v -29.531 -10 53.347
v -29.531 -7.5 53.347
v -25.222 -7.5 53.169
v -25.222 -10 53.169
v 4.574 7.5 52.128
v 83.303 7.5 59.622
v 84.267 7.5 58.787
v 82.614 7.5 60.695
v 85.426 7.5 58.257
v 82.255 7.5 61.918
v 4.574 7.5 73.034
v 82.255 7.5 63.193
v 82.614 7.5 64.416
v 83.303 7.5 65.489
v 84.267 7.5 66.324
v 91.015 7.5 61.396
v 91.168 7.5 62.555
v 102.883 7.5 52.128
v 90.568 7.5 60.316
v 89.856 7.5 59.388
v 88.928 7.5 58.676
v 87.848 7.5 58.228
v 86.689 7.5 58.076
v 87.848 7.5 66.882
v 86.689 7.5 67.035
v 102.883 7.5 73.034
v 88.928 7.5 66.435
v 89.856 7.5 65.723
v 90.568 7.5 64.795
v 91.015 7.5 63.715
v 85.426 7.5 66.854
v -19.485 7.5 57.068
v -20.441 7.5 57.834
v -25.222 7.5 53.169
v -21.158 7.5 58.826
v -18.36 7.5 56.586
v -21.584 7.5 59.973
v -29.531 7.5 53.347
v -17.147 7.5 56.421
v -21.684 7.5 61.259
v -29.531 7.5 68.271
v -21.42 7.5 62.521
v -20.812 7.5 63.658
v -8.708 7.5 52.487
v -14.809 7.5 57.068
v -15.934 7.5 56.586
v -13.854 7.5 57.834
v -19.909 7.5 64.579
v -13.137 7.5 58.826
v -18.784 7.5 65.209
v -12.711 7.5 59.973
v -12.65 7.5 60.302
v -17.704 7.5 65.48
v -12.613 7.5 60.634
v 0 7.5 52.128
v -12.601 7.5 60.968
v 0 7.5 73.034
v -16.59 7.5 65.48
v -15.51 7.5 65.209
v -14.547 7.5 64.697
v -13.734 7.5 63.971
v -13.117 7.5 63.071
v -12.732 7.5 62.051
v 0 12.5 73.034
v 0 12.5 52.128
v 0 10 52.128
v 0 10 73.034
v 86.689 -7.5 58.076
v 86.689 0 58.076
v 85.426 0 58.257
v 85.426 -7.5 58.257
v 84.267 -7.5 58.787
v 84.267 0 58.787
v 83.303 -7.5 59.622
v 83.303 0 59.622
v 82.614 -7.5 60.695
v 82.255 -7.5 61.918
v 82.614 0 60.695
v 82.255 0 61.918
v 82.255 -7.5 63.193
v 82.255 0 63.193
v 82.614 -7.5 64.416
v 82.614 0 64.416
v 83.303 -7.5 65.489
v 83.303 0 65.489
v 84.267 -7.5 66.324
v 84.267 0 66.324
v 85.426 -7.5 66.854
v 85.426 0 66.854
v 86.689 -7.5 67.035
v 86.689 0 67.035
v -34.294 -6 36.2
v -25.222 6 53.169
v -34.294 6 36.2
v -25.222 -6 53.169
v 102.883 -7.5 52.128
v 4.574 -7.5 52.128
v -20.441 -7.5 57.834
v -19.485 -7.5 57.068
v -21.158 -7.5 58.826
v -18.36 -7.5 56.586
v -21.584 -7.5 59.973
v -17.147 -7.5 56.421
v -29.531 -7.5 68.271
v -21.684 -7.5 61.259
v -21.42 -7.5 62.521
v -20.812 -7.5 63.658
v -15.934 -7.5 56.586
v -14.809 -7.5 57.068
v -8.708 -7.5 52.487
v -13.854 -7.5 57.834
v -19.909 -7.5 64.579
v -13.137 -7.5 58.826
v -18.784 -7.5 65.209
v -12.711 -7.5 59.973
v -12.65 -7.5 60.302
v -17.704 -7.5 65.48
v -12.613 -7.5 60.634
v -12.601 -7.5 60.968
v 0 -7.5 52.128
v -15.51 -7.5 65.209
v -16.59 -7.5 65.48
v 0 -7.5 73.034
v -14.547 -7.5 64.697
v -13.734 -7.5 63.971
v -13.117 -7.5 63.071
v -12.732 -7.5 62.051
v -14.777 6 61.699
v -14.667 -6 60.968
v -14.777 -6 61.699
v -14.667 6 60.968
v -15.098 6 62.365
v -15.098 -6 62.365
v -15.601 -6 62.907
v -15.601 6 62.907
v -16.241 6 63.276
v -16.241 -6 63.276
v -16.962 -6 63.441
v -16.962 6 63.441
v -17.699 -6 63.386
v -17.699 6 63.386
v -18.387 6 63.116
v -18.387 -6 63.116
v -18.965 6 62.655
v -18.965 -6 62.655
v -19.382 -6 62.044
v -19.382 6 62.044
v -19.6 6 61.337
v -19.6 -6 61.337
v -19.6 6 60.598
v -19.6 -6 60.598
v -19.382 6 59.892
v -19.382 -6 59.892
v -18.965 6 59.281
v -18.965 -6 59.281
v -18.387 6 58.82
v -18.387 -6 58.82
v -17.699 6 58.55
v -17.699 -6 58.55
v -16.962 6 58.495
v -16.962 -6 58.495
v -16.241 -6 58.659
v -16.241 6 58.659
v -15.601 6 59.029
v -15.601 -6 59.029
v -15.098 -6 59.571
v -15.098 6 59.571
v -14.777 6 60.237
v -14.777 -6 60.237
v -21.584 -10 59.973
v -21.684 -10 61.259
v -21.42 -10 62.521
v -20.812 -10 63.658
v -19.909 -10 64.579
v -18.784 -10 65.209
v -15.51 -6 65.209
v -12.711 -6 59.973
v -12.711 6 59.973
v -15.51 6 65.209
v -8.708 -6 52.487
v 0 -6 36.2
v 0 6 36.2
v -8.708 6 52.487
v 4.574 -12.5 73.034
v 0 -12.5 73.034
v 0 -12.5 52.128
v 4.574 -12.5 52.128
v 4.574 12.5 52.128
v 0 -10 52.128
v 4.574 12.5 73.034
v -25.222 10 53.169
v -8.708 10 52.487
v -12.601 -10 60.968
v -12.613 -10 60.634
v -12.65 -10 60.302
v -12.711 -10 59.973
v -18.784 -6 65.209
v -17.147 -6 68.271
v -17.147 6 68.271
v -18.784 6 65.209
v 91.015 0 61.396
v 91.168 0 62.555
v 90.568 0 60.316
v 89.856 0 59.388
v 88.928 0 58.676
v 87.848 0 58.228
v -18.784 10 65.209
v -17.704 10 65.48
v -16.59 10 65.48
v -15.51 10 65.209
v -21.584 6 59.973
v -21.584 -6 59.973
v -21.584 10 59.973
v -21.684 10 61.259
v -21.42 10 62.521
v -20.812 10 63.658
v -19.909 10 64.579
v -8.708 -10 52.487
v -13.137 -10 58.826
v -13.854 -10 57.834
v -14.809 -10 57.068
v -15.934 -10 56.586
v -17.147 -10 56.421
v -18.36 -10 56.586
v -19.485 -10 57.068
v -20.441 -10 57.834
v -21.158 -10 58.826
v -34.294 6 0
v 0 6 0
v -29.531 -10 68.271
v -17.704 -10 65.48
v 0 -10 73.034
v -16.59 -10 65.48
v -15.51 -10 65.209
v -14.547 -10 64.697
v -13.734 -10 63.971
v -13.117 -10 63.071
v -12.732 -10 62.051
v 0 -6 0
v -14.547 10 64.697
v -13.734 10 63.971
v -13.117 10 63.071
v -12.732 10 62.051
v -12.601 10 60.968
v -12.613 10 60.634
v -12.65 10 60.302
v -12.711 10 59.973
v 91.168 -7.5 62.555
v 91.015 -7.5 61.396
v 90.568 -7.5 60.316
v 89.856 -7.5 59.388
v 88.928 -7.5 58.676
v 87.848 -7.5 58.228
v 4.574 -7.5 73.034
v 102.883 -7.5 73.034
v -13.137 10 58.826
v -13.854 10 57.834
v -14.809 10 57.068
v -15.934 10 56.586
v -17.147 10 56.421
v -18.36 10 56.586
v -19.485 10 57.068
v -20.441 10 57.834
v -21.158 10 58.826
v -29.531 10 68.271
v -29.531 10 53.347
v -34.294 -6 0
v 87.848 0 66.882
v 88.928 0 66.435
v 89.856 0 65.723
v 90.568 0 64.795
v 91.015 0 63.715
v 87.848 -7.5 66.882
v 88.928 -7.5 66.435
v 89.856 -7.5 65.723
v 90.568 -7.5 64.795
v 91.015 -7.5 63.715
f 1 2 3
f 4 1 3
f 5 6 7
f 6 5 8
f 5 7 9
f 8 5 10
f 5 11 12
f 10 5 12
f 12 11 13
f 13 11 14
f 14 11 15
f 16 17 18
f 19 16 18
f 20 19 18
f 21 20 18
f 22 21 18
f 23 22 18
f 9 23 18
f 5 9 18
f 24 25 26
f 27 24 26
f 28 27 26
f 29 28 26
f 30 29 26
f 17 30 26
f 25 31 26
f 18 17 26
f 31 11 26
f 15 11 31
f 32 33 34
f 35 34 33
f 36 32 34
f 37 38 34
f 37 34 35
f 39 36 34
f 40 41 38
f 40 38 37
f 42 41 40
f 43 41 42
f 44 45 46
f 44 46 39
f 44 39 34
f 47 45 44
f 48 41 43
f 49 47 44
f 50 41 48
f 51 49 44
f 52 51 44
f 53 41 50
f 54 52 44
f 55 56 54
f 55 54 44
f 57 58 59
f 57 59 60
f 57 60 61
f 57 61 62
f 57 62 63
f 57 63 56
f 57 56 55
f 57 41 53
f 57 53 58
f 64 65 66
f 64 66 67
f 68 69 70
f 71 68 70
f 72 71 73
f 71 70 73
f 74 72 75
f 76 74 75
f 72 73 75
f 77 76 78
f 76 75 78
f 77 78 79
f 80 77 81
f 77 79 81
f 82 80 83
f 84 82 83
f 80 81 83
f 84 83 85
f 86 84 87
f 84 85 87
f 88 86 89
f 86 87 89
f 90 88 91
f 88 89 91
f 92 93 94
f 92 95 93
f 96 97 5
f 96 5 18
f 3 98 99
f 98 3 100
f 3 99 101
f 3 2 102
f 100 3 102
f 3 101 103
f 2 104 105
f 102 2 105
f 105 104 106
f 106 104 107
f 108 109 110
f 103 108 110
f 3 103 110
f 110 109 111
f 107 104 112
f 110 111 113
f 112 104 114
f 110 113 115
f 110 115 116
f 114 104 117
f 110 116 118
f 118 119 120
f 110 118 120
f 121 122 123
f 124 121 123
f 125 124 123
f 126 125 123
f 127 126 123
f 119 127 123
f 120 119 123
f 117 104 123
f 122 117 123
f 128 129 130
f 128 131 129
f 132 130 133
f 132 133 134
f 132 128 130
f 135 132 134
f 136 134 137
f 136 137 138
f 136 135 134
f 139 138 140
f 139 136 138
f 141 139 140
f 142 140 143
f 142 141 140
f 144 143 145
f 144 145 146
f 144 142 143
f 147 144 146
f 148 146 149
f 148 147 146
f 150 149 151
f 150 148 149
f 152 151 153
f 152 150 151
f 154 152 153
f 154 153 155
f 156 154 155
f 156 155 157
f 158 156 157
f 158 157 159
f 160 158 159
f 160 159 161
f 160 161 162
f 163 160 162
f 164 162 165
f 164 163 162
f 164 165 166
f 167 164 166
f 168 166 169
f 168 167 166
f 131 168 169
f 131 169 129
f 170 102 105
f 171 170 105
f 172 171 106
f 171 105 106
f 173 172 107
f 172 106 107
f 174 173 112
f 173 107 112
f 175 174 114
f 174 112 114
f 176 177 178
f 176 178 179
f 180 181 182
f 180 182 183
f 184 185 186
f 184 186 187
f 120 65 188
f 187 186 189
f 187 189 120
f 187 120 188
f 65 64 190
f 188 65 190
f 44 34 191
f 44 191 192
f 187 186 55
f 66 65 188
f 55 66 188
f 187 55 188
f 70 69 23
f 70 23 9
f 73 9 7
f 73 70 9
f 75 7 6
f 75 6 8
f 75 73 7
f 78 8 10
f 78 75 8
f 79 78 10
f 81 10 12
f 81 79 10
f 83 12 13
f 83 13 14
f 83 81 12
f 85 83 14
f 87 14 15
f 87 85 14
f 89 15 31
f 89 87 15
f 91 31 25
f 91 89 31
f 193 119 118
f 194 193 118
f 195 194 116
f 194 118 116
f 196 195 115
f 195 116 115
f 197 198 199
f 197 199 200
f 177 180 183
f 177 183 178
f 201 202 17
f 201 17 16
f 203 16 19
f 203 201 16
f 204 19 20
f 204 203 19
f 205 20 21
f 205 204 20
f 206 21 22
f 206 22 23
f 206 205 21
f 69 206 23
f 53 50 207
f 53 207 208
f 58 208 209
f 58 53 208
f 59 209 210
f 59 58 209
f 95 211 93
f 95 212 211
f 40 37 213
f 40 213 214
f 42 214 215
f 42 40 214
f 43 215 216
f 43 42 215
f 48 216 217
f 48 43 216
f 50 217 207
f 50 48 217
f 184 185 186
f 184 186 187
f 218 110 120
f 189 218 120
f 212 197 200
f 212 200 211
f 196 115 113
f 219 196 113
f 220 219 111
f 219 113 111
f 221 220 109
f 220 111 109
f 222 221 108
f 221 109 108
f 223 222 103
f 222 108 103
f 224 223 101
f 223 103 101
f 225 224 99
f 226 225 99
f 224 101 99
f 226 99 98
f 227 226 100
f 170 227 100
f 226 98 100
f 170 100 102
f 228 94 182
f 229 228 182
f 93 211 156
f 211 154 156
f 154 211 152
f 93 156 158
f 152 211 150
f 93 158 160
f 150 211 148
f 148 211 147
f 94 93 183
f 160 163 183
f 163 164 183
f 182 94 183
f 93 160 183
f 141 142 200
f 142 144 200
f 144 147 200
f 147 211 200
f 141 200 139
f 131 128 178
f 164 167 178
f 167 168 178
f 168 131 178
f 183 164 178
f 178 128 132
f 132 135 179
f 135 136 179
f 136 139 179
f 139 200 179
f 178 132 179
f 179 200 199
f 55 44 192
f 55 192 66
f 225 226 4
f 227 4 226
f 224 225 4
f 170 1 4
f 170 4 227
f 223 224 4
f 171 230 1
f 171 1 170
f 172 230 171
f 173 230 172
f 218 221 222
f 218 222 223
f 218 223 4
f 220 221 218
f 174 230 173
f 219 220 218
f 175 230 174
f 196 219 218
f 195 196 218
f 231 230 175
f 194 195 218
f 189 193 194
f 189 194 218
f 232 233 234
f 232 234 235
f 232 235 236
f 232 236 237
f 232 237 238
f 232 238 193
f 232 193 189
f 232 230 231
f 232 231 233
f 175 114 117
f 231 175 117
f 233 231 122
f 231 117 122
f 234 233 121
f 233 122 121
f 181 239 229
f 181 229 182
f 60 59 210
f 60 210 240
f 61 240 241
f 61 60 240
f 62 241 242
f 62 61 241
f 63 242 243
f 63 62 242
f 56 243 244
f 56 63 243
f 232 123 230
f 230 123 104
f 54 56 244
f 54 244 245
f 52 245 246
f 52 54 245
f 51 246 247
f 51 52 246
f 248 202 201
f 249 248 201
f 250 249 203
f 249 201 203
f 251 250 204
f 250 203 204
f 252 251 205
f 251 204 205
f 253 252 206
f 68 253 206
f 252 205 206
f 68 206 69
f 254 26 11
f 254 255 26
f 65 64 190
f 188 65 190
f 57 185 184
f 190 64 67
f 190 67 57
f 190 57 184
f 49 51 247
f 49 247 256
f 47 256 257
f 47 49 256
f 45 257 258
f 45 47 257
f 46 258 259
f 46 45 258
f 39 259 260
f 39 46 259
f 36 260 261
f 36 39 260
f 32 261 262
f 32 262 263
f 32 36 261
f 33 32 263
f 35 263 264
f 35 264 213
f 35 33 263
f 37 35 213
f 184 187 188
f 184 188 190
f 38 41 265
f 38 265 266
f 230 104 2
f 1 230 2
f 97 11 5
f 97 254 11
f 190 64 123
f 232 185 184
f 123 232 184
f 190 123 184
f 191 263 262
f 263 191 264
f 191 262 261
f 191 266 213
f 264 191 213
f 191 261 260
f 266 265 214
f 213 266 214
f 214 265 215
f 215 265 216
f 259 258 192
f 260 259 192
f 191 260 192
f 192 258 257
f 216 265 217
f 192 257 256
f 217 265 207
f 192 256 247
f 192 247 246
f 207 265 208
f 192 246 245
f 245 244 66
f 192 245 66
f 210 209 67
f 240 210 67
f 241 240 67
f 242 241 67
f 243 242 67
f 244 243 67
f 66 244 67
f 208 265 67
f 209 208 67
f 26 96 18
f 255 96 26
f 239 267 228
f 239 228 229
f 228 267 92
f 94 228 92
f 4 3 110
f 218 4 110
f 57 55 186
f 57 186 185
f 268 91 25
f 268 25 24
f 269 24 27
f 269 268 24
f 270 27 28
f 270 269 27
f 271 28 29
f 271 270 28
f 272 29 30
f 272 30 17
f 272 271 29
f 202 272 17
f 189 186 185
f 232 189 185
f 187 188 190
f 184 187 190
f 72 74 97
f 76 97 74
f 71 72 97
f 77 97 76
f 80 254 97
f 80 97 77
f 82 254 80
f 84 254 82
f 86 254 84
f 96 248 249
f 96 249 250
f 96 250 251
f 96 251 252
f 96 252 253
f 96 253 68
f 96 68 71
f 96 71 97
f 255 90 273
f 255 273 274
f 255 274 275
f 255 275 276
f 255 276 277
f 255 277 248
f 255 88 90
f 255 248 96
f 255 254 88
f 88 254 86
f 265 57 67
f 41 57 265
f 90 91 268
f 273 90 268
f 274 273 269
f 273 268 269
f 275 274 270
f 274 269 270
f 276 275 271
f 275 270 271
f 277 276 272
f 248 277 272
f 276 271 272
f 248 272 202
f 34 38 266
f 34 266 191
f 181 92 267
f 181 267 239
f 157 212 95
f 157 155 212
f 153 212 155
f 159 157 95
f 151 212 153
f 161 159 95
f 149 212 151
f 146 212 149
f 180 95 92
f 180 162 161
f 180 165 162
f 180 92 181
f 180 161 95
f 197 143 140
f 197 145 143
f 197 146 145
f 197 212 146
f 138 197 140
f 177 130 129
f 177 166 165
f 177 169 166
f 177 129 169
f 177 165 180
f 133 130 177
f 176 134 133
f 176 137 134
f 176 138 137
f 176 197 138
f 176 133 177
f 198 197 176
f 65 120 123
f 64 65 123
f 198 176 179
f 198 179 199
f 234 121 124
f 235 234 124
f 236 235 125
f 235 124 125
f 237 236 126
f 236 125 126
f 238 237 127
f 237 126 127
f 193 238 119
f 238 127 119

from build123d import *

# Parameters (mm, degrees)
F0_W     = 4.574092105
F0_H     = 20.906448481
F1_DEPTH = 12.5
F2_START = 7.5
F2_DEPTH = 2.5
F4_DEPTH = 7.5
F0_W_2   = 34.2943556607
F0_H_2   = 36.1995995045
F0_R     = 2.4800674326
F5_DEPTH = 6


with BuildPart() as f1:
    # F0 (on Front) → F1 (new body, symmetric)
    with BuildSketch(Plane.XZ):
        with Locations((2.2870460525, 62.5810548079)):
            Rectangle(F0_W, F0_H)
    extrude(amount=F1_DEPTH, both=True)

    # F0 (on Front) → F2 (join)
    with BuildSketch(Plane.XZ.offset(F2_START)):
        with BuildLine():
            Line((-25.2216641664, 53.168891048), (-8.7082639789, 52.4872766937))
            Line((-8.7082639789, 52.4872766937), (-12.7107553091, 59.9734170883))
            ThreePointArc((-12.7107553091, 59.9734170883), (-17.1471778303, 56.4212579855), (-21.5836003516, 59.9734170883))
            Line((-21.5836003516, 59.9734170883), (-25.2216641664, 53.168891048))
        make_face()
        with BuildLine():
            Line((-12.7107553091, 59.9734170883), (-8.7082639789, 52.4872766937))
            Line((-8.7082639789, 52.4872766937), (0, 52.1278305674))
            Line((0, 52.1278305674), (0, 73.0342790484))
            Line((0, 73.0342790484), (-29.5312516391, 68.271169439))
            Line((-29.5312516391, 68.271169439), (-29.5312516391, 53.3467754722))
            Line((-29.5312516391, 53.3467754722), (-25.2216641664, 53.168891048))
            Line((-25.2216641664, 53.168891048), (-21.5836003516, 59.9734170883))
            ThreePointArc((-21.5836003516, 59.9734170883), (-21.1565826315, 63.1113857959), (-18.7842306449, 65.2092746859))
            Line((-18.7842306449, 65.2092746859), (-17.1471778303, 68.271169439))
            Line((-17.1471778303, 68.271169439), (-15.5101250158, 65.2092746859))
            ThreePointArc((-15.5101250158, 65.2092746859), (-13.3979534883, 63.5394833579), (-12.6006924191, 60.9677433968))
            ThreePointArc((-12.6006924191, 60.9677433968), (-12.6282919131, 60.4675437748), (-12.7107553091, 59.9734170883))
        make_face()
        with BuildLine():
            ThreePointArc((-18.7842306449, 65.2092746859), (-17.1471778303, 65.514228808), (-15.5101250158, 65.2092746859))
            Line((-15.5101250158, 65.2092746859), (-17.1471778303, 68.271169439))
            Line((-17.1471778303, 68.271169439), (-18.7842306449, 65.2092746859))
        make_face()
    extrude(amount=F2_DEPTH)


with BuildPart() as f3_1:
    # F3: instance of F1
    add(f1.part.mirror(Plane.XZ))


with BuildPart() as f4:
    # F0 (on Front) → F4 (new body, symmetric)
    with BuildSketch(Plane.XZ):
        Polygon((4.574092105, 73.0342790484), (4.574092105, 52.1278305674), (86.6885110736, 52.1278305674), (86.6885110736, 56.0208766968), (80.2129593988, 57.2697704448), (80.2129593988, 66.8070286696), (86.6885110736, 68.3046103878), (86.6885110736, 73.0342790484), align=None)
        Polygon((102.8830707073, 73.0342790484), (86.6885110736, 73.0342790484), (86.6885110736, 68.3046103878), (102.8830707073, 72.0498783834), align=None)
        with BuildLine():
            Line((86.6885110736, 58.0758508295), (86.6885110736, 56.0208766968))
            Line((86.6885110736, 56.0208766968), (102.8830707073, 52.8975467795))
            Line((102.8830707073, 52.8975467795), (102.8830707073, 72.0498783834))
            Line((102.8830707073, 72.0498783834), (86.6885110736, 68.3046103878))
            Line((86.6885110736, 68.3046103878), (86.6885110736, 67.0350436121))
            ThreePointArc((86.6885110736, 67.0350436121), (89.8560640589, 65.7230002061), (91.1681074649, 62.5554472208))
            ThreePointArc((91.1681074649, 62.5554472208), (89.8560640589, 59.3878942355), (86.6885110736, 58.0758508295))
        make_face()
        Polygon((86.6885110736, 56.0208766968), (86.6885110736, 52.1278305674), (102.8830707073, 52.1278305674), (102.8830707073, 52.8975467795), align=None)
        with BuildLine():
            Line((80.2129593988, 57.2697704448), (86.6885110736, 56.0208766968))
            Line((86.6885110736, 56.0208766968), (86.6885110736, 58.0758508295))
            ThreePointArc((86.6885110736, 58.0758508295), (82.2089146823, 62.5554472208), (86.6885110736, 67.0350436121))
            Line((86.6885110736, 67.0350436121), (86.6885110736, 68.3046103878))
            Line((86.6885110736, 68.3046103878), (80.2129593988, 66.8070286696))
            Line((80.2129593988, 66.8070286696), (80.2129593988, 57.2697704448))
        make_face()
    extrude(amount=F4_DEPTH, both=True)


with BuildPart() as f5:
    # F0 (on Front) → F5 (new body, symmetric)
    with BuildSketch(Plane.XZ):
        with Locations((-17.1471778303, 18.0997997522)):
            Rectangle(F0_W_2, F0_H_2)
        Polygon((-34.2943556607, 36.1995995045), (0, 36.1995995045), (-8.7082639789, 52.4872766937), (-25.2216641664, 53.168891048), align=None)
        with BuildLine():
            Line((-25.2216641664, 53.168891048), (-8.7082639789, 52.4872766937))
            Line((-8.7082639789, 52.4872766937), (-12.7107553091, 59.9734170883))
            ThreePointArc((-12.7107553091, 59.9734170883), (-17.1471778303, 56.4212579855), (-21.5836003516, 59.9734170883))
            Line((-21.5836003516, 59.9734170883), (-25.2216641664, 53.168891048))
        make_face()
        with BuildLine():
            ThreePointArc((-21.5836003516, 59.9734170883), (-17.1471778303, 56.4212579855), (-12.7107553091, 59.9734170883))
            Line((-12.7107553091, 59.9734170883), (-15.5101250158, 65.2092746859))
            ThreePointArc((-15.5101250158, 65.2092746859), (-17.1471778303, 65.514228808), (-18.7842306449, 65.2092746859))
            Line((-18.7842306449, 65.2092746859), (-21.5836003516, 59.9734170883))
        make_face()
        with Locations((-17.1471778303, 60.9677433968)):
            Circle(F0_R, mode=Mode.SUBTRACT)
        with BuildLine():
            ThreePointArc((-18.7842306449, 65.2092746859), (-17.1471778303, 65.514228808), (-15.5101250158, 65.2092746859))
            Line((-15.5101250158, 65.2092746859), (-17.1471778303, 68.271169439))
            Line((-17.1471778303, 68.271169439), (-18.7842306449, 65.2092746859))
        make_face()
    extrude(amount=F5_DEPTH, both=True)


solid = Compound([f1.part, f3_1.part, f4.part, f5.part])
